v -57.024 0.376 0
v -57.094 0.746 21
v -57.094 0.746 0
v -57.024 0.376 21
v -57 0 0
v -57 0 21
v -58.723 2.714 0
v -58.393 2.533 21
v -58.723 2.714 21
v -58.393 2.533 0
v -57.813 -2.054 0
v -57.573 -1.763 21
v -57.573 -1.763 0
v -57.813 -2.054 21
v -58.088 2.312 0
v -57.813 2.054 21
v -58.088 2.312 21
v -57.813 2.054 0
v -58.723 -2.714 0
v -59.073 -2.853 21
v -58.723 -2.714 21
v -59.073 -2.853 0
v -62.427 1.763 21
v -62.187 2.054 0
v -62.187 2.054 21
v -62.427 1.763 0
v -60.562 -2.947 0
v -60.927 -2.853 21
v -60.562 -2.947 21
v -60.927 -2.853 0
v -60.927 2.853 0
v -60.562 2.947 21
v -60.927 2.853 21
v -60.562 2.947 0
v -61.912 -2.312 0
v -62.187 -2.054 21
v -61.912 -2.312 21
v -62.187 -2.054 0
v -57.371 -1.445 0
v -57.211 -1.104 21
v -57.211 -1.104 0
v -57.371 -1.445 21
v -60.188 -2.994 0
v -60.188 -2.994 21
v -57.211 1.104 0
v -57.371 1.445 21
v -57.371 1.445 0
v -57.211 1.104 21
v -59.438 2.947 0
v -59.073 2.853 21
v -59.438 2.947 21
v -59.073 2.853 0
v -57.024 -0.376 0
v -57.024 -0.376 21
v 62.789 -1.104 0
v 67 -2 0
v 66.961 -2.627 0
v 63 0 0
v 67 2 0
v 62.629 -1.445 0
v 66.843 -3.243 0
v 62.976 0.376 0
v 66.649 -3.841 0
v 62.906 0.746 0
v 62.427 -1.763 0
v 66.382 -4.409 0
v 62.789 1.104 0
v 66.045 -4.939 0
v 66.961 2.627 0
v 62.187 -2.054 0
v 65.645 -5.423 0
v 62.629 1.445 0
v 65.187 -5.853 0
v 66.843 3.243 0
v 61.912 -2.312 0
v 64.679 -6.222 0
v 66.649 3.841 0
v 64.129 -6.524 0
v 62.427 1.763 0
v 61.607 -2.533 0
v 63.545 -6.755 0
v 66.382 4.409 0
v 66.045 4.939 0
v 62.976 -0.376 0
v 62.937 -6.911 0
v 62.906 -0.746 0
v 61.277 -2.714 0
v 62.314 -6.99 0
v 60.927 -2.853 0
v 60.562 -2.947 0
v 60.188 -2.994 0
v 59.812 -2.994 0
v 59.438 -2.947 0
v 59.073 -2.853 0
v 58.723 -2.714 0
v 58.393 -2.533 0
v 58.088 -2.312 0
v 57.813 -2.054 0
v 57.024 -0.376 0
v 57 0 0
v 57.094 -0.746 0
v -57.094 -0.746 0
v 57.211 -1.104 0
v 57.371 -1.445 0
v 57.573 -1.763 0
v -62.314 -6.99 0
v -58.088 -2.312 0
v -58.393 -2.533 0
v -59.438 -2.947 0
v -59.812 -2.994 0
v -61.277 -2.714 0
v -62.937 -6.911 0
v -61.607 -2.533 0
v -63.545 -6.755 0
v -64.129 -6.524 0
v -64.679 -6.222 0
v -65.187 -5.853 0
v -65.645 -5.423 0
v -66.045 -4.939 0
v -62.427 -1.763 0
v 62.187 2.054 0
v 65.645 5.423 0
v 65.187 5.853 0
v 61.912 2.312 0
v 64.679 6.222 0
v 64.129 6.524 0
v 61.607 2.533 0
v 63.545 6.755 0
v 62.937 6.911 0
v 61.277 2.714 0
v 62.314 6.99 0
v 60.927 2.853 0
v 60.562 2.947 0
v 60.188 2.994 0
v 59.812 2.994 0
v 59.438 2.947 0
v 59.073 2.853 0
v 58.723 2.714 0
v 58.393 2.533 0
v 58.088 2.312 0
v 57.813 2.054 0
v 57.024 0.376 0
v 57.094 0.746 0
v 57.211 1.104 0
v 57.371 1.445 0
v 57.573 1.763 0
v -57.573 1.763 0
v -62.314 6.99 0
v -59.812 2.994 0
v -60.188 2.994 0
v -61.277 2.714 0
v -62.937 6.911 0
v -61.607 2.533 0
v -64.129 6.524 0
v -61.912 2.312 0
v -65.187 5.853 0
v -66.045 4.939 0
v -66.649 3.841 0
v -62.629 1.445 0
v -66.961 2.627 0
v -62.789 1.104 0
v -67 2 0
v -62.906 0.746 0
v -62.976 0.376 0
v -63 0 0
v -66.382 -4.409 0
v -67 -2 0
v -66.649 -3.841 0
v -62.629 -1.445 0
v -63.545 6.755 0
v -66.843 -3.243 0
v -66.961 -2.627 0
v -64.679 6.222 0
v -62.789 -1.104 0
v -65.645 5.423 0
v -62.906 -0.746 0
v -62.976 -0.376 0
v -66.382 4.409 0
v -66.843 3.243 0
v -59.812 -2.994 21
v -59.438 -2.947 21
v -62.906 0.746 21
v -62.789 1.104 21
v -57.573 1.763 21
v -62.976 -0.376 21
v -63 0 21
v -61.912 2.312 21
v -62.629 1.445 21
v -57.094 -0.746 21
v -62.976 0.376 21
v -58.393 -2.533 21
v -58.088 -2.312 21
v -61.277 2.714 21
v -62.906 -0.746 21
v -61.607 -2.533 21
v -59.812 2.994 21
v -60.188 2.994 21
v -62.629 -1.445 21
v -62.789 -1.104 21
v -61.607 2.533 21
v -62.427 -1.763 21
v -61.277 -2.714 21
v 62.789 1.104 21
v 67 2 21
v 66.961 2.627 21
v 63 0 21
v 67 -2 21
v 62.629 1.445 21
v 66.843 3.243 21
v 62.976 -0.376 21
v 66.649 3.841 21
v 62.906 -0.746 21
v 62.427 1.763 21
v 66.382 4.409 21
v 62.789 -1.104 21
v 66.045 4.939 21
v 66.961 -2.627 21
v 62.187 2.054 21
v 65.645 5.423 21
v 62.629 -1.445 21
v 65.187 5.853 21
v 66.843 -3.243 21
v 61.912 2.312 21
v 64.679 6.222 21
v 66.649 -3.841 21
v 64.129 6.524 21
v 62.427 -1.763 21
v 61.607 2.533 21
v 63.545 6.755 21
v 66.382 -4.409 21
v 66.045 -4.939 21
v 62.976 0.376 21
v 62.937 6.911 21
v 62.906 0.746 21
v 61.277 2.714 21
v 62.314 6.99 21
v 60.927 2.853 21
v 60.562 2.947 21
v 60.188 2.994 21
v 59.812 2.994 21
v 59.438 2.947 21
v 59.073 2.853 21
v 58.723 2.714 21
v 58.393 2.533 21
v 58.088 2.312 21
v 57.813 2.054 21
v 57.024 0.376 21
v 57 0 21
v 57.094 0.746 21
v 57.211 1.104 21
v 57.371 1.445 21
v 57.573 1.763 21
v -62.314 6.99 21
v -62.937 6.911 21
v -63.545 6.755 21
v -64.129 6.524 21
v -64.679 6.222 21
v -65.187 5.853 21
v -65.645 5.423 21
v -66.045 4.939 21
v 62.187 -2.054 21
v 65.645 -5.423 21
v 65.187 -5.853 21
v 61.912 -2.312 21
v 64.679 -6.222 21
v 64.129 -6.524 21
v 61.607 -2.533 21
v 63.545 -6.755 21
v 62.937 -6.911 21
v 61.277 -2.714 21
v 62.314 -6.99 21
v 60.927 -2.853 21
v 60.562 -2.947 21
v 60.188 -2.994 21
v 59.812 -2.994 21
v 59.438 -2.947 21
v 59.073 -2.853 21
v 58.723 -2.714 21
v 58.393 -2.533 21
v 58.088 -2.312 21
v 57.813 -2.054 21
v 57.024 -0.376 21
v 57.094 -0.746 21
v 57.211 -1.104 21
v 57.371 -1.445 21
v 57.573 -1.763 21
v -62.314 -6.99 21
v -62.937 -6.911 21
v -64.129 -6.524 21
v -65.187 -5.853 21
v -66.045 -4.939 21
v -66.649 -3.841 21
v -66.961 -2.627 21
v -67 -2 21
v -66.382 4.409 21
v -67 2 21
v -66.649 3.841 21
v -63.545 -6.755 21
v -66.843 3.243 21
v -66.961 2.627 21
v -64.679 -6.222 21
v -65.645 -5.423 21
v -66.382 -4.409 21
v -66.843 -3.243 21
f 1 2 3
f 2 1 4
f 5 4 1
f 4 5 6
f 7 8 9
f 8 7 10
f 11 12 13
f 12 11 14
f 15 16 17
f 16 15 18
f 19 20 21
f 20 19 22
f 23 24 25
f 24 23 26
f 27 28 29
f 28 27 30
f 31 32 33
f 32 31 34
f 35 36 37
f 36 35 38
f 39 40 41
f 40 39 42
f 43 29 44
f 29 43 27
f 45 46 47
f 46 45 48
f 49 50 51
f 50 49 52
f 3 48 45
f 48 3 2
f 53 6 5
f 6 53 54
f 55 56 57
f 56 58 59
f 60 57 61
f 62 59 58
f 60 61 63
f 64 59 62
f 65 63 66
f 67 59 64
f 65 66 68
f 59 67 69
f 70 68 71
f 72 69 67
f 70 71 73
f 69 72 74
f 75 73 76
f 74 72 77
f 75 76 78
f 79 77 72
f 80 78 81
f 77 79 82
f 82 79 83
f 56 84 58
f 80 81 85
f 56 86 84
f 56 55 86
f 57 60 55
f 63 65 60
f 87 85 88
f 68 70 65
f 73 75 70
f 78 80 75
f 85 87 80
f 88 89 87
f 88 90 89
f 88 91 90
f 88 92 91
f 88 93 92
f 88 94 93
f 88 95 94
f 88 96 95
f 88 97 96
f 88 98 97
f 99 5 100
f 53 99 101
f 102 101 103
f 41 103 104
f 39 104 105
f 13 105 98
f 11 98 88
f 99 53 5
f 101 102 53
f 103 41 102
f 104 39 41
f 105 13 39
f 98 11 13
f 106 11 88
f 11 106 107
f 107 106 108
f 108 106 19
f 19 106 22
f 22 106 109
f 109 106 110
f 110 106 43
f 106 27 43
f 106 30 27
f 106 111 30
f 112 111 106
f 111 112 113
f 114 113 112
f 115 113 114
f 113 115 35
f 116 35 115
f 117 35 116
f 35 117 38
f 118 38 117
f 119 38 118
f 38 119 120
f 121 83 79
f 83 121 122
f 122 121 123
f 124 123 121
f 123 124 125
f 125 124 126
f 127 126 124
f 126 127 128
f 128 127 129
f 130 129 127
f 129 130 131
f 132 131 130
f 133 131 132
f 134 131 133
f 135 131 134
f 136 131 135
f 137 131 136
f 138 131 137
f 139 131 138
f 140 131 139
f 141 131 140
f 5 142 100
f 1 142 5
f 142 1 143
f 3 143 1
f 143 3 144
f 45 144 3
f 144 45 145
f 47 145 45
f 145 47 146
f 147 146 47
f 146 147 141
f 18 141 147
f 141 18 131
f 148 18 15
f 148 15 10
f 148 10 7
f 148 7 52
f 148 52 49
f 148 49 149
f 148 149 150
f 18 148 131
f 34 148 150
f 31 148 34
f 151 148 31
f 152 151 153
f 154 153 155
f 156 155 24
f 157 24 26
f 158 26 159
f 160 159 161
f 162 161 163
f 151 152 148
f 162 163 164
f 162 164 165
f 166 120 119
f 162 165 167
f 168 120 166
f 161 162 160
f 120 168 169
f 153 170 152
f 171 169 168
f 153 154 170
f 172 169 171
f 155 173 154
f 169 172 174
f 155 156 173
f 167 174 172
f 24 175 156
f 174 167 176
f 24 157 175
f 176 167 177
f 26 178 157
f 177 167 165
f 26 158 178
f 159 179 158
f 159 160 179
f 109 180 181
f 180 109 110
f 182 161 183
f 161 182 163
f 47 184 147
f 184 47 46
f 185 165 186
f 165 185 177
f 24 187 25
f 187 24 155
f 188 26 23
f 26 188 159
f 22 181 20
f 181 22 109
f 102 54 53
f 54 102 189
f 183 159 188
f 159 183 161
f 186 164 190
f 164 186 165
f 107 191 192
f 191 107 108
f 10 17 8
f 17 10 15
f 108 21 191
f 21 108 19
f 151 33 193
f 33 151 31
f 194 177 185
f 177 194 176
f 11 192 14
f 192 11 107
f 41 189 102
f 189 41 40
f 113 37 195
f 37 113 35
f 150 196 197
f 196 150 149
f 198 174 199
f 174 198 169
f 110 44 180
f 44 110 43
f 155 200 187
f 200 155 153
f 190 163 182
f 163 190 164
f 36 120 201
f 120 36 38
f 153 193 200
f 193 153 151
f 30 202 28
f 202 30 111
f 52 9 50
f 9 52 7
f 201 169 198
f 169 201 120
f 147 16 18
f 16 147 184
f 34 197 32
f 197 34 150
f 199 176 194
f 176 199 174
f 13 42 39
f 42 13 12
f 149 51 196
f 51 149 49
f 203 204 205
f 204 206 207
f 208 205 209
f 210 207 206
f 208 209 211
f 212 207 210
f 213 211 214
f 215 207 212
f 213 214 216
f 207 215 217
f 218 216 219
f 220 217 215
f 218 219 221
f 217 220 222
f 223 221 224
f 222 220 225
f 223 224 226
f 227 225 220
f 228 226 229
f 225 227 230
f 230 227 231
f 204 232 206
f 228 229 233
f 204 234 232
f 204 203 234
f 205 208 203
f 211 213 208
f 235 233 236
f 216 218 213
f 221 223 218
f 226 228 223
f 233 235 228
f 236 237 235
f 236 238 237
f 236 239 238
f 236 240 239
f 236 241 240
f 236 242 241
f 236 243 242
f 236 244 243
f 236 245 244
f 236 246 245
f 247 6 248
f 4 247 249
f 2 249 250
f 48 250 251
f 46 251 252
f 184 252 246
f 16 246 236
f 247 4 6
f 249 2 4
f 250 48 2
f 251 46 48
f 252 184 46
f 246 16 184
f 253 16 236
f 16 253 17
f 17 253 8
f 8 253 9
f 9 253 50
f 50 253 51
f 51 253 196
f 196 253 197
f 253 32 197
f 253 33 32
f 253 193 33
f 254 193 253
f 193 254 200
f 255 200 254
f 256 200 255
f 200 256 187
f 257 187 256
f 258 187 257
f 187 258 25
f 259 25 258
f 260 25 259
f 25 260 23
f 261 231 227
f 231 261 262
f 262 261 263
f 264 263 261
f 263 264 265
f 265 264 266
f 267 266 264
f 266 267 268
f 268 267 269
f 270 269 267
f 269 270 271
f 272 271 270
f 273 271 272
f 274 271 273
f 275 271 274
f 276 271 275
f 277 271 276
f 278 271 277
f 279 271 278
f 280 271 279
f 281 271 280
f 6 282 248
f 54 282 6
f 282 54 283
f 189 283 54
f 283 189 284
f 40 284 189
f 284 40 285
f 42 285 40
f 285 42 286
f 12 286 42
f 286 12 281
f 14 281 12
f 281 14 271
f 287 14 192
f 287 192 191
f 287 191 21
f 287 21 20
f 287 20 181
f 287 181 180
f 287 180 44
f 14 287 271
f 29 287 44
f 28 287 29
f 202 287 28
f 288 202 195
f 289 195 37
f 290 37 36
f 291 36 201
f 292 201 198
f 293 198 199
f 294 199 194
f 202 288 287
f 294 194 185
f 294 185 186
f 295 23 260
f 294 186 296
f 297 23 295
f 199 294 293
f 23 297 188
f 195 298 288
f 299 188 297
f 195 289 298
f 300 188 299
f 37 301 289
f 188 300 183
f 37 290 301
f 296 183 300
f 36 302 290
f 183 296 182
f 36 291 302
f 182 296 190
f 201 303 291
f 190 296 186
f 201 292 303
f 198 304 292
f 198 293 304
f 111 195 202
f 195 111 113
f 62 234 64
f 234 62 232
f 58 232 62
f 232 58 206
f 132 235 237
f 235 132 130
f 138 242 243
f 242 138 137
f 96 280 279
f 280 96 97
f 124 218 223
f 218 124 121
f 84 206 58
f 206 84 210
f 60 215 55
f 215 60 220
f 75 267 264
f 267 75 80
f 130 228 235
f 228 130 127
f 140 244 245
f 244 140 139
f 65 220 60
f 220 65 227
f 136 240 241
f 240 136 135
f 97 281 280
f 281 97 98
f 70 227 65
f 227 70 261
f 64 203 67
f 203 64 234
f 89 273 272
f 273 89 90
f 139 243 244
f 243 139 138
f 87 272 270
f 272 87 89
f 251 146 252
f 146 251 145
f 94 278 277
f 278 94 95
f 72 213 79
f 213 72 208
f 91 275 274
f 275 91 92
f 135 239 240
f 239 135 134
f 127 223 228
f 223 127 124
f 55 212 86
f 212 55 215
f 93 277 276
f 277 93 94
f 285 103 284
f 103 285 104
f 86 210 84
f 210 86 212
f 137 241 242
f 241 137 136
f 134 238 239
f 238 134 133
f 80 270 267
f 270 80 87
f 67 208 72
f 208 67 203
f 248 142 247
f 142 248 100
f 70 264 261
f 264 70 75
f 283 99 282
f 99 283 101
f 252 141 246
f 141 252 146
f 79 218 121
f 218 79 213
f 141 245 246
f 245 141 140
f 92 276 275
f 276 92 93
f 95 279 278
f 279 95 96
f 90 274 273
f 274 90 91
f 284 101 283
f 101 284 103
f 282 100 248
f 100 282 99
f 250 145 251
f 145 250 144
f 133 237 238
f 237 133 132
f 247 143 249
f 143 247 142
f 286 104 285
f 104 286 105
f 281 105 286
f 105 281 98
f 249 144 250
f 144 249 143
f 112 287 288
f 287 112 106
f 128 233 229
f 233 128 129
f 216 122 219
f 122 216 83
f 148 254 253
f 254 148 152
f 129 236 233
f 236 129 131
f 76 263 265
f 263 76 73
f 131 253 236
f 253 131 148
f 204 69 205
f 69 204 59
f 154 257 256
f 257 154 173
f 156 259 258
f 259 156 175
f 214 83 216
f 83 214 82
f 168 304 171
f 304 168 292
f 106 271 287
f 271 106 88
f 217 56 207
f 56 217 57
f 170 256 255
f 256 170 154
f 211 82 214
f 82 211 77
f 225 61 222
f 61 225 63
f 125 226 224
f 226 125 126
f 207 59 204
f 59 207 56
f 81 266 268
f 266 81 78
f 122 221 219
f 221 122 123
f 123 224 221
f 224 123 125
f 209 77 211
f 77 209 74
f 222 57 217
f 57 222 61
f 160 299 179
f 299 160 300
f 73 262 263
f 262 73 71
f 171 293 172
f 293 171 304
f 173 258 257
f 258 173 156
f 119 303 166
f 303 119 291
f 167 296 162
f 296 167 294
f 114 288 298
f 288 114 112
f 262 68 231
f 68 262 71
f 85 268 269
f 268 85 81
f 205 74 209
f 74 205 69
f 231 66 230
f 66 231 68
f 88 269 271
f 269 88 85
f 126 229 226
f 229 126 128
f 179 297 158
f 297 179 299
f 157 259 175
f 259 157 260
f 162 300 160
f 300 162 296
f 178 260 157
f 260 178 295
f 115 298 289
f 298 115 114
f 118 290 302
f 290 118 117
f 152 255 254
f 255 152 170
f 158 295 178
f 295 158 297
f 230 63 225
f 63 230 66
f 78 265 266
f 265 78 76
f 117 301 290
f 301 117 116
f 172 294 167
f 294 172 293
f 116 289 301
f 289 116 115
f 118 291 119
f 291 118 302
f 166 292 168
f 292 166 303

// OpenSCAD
$fn = 50;


difference() {
	union() {
		hull() {
			translate(v = [-62.0000000000, 2.0000000000, 0]) {
				cylinder(h = 21, r = 5);
			}
			translate(v = [62.0000000000, 2.0000000000, 0]) {
				cylinder(h = 21, r = 5);
			}
			translate(v = [-62.0000000000, -2.0000000000, 0]) {
				cylinder(h = 21, r = 5);
			}
			translate(v = [62.0000000000, -2.0000000000, 0]) {
				cylinder(h = 21, r = 5);
			}
		}
	}
	union() {
		translate(v = [-60.0000000000, 0.0000000000, 0]) {
			cylinder(h = 21, r = 3.0000000000);
		}
		translate(v = [60.0000000000, 0.0000000000, 0]) {
			cylinder(h = 21, r = 3.0000000000);
		}
		translate(v = [-60.0000000000, 0.0000000000, 0]) {
			cylinder(h = 21, r = 1.5000000000);
		}
		translate(v = [60.0000000000, 0.0000000000, 0]) {
			cylinder(h = 21, r = 1.5000000000);
		}
		translate(v = [-60.0000000000, 0.0000000000, 0]) {
			cylinder(h = 21, r = 1.5000000000);
		}
		translate(v = [60.0000000000, 0.0000000000, 0]) {
			cylinder(h = 21, r = 1.5000000000);
		}
		translate(v = [-60.0000000000, 0.0000000000, 0]) {
			cylinder(h = 21, r = 1.5000000000);
		}
		translate(v = [60.0000000000, 0.0000000000, 0]) {
			cylinder(h = 21, r = 1.5000000000);
		}
	}
}
